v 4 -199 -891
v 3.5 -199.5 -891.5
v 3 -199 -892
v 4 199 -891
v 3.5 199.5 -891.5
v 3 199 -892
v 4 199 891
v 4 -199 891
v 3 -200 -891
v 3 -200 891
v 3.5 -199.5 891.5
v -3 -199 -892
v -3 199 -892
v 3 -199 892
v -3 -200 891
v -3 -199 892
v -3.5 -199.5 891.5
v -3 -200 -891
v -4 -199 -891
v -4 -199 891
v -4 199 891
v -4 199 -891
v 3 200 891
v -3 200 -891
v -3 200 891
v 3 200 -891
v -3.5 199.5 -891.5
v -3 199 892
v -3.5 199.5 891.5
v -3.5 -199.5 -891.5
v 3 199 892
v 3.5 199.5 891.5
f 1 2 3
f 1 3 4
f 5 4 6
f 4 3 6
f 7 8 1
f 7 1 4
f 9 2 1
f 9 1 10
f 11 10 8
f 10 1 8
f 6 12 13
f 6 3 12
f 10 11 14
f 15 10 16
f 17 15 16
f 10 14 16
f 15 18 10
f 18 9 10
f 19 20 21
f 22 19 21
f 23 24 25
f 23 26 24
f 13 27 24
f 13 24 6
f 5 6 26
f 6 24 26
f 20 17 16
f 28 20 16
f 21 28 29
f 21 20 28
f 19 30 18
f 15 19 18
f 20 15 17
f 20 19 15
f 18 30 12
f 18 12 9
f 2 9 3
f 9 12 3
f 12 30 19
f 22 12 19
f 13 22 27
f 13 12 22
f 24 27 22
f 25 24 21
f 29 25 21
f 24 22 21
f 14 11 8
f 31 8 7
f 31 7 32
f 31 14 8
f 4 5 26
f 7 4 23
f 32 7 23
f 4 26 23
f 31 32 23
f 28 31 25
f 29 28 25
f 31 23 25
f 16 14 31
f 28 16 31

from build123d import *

# Parameters (mm, degrees)
F0_W     = 400
F0_H     = 1784
F1_DEPTH = 4
F2_SIZE  = 1
F3_SIZE  = 1


with BuildPart() as f1:
    # F0 (on Right) → F1 (new body, symmetric)
    with BuildSketch(Plane.YZ):
        Rectangle(F0_W, F0_H)
    extrude(amount=F1_DEPTH, both=True)

    # F2
    f2_edges = [f1.edges().sort_by_distance(p)[0] for p in [
        (4, 200, 0),
        (-4, 200, 0),
        (4, 0, 892),
        (-4, 0, 892),
        (-4, 0, -892),
        (4, 0, -892),
        (-4, -200, 0),
        (4, -200, 0),
    ]]
    chamfer(f2_edges, length=F2_SIZE)

    # F3
    f3_edges = [f1.edges().sort_by_distance(p)[0] for p in [
        (0, 200, -892),
        (0, -200, -892),
        (0, -200, 892),
        (0, 200, 892),
    ]]
    chamfer(f3_edges, length=F3_SIZE)


solid = f1.part
